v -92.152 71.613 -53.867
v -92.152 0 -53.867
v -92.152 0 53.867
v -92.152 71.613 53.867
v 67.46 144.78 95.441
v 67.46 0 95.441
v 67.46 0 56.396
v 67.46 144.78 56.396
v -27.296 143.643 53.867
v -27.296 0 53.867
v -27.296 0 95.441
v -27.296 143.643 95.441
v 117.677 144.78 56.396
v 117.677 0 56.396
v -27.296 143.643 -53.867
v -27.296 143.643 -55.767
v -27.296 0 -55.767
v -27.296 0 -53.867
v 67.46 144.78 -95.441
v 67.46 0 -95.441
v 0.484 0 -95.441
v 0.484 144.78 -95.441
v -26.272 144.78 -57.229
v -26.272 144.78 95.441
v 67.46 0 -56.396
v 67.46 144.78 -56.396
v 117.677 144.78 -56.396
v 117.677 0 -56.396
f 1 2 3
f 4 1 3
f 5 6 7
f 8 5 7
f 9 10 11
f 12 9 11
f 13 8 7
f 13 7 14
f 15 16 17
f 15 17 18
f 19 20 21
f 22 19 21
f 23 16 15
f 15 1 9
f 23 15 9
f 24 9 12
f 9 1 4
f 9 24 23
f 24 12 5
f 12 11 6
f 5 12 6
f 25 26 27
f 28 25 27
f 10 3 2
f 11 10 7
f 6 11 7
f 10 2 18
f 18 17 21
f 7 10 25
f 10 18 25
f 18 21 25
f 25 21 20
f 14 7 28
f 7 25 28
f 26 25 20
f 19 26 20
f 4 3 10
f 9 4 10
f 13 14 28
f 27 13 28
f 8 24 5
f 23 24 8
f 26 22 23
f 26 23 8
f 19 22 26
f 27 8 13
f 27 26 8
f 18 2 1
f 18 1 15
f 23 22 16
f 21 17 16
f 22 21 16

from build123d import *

# Parameters (mm, degrees)
SKETCH1_W           = 64.856187625
SKETCH1_H           = 53.867265469
SKETCH1_W_2         = 50.216999898
SKETCH1_H_2         = 56.395605674
BOSS_EXTRUDE1_DEPTH = 144.78
CHAMFER1_SIZE       = 65.88
CHAMFER1_SIZE2      = 73.167152477
CHAMFER2_SIZE       = 27.78
CHAMFER2_SIZE2      = 39.673951627


with BuildPart() as part:
    # Sketch1 → Boss-Extrude1 (new body)
    with BuildSketch(Plane(origin=(0, 0, 0), x_dir=(1, 0, 0), z_dir=(0, 1, 0))):
        with Locations((-59.723790396, -26.933632735)):
            Rectangle(SKETCH1_W, SKETCH1_H)
        with Locations((-59.723790396, 26.933632735)):
            Rectangle(SKETCH1_W, SKETCH1_H)
        Polygon((-27.295696583, 53.867265469), (-27.295696583, 0), (67.459562421, 0), (67.459562421, 56.395605674), (67.459562421, 95.440559589), (-27.295696583, 95.440559589), align=None)
        Polygon((67.459562421, 0), (-27.295696583, 0), (-27.295696583, -53.867265469), (-27.295696583, -95.440559589), (67.459562421, -95.440559589), (67.459562421, -56.395605674), align=None)
        with Locations((92.56806237, 28.197802837)):
            Rectangle(SKETCH1_W_2, SKETCH1_H_2)
        with Locations((92.56806237, -28.197802837)):
            Rectangle(SKETCH1_W_2, SKETCH1_H_2)
    extrude(amount=BOSS_EXTRUDE1_DEPTH)

    # Chamfer1
    chamfer1_edges = [part.edges().sort_by_distance(p)[0] for p in [
        (-92.151884208, 144.78, 0),
    ]]
    chamfer1_side = [part.faces().sort_by_distance(p)[0] for p in [
        (15.2977171, 144.78, 0),
    ]]
    chamfer(chamfer1_edges, length=CHAMFER1_SIZE, length2=CHAMFER1_SIZE2, reference=chamfer1_side[0])

    # Chamfer2
    chamfer2_edges = [part.edges().sort_by_distance(p)[0] for p in [
        (-27.295696583, 71.821470582, -95.440559589),
    ]]
    chamfer2_side = [part.faces().sort_by_distance(p)[0] for p in [
        (20.083928703, 72.386944526, -95.440559589),
    ]]
    chamfer(chamfer2_edges, length=CHAMFER2_SIZE, length2=CHAMFER2_SIZE2, reference=chamfer2_side[0])


solid = part.part
